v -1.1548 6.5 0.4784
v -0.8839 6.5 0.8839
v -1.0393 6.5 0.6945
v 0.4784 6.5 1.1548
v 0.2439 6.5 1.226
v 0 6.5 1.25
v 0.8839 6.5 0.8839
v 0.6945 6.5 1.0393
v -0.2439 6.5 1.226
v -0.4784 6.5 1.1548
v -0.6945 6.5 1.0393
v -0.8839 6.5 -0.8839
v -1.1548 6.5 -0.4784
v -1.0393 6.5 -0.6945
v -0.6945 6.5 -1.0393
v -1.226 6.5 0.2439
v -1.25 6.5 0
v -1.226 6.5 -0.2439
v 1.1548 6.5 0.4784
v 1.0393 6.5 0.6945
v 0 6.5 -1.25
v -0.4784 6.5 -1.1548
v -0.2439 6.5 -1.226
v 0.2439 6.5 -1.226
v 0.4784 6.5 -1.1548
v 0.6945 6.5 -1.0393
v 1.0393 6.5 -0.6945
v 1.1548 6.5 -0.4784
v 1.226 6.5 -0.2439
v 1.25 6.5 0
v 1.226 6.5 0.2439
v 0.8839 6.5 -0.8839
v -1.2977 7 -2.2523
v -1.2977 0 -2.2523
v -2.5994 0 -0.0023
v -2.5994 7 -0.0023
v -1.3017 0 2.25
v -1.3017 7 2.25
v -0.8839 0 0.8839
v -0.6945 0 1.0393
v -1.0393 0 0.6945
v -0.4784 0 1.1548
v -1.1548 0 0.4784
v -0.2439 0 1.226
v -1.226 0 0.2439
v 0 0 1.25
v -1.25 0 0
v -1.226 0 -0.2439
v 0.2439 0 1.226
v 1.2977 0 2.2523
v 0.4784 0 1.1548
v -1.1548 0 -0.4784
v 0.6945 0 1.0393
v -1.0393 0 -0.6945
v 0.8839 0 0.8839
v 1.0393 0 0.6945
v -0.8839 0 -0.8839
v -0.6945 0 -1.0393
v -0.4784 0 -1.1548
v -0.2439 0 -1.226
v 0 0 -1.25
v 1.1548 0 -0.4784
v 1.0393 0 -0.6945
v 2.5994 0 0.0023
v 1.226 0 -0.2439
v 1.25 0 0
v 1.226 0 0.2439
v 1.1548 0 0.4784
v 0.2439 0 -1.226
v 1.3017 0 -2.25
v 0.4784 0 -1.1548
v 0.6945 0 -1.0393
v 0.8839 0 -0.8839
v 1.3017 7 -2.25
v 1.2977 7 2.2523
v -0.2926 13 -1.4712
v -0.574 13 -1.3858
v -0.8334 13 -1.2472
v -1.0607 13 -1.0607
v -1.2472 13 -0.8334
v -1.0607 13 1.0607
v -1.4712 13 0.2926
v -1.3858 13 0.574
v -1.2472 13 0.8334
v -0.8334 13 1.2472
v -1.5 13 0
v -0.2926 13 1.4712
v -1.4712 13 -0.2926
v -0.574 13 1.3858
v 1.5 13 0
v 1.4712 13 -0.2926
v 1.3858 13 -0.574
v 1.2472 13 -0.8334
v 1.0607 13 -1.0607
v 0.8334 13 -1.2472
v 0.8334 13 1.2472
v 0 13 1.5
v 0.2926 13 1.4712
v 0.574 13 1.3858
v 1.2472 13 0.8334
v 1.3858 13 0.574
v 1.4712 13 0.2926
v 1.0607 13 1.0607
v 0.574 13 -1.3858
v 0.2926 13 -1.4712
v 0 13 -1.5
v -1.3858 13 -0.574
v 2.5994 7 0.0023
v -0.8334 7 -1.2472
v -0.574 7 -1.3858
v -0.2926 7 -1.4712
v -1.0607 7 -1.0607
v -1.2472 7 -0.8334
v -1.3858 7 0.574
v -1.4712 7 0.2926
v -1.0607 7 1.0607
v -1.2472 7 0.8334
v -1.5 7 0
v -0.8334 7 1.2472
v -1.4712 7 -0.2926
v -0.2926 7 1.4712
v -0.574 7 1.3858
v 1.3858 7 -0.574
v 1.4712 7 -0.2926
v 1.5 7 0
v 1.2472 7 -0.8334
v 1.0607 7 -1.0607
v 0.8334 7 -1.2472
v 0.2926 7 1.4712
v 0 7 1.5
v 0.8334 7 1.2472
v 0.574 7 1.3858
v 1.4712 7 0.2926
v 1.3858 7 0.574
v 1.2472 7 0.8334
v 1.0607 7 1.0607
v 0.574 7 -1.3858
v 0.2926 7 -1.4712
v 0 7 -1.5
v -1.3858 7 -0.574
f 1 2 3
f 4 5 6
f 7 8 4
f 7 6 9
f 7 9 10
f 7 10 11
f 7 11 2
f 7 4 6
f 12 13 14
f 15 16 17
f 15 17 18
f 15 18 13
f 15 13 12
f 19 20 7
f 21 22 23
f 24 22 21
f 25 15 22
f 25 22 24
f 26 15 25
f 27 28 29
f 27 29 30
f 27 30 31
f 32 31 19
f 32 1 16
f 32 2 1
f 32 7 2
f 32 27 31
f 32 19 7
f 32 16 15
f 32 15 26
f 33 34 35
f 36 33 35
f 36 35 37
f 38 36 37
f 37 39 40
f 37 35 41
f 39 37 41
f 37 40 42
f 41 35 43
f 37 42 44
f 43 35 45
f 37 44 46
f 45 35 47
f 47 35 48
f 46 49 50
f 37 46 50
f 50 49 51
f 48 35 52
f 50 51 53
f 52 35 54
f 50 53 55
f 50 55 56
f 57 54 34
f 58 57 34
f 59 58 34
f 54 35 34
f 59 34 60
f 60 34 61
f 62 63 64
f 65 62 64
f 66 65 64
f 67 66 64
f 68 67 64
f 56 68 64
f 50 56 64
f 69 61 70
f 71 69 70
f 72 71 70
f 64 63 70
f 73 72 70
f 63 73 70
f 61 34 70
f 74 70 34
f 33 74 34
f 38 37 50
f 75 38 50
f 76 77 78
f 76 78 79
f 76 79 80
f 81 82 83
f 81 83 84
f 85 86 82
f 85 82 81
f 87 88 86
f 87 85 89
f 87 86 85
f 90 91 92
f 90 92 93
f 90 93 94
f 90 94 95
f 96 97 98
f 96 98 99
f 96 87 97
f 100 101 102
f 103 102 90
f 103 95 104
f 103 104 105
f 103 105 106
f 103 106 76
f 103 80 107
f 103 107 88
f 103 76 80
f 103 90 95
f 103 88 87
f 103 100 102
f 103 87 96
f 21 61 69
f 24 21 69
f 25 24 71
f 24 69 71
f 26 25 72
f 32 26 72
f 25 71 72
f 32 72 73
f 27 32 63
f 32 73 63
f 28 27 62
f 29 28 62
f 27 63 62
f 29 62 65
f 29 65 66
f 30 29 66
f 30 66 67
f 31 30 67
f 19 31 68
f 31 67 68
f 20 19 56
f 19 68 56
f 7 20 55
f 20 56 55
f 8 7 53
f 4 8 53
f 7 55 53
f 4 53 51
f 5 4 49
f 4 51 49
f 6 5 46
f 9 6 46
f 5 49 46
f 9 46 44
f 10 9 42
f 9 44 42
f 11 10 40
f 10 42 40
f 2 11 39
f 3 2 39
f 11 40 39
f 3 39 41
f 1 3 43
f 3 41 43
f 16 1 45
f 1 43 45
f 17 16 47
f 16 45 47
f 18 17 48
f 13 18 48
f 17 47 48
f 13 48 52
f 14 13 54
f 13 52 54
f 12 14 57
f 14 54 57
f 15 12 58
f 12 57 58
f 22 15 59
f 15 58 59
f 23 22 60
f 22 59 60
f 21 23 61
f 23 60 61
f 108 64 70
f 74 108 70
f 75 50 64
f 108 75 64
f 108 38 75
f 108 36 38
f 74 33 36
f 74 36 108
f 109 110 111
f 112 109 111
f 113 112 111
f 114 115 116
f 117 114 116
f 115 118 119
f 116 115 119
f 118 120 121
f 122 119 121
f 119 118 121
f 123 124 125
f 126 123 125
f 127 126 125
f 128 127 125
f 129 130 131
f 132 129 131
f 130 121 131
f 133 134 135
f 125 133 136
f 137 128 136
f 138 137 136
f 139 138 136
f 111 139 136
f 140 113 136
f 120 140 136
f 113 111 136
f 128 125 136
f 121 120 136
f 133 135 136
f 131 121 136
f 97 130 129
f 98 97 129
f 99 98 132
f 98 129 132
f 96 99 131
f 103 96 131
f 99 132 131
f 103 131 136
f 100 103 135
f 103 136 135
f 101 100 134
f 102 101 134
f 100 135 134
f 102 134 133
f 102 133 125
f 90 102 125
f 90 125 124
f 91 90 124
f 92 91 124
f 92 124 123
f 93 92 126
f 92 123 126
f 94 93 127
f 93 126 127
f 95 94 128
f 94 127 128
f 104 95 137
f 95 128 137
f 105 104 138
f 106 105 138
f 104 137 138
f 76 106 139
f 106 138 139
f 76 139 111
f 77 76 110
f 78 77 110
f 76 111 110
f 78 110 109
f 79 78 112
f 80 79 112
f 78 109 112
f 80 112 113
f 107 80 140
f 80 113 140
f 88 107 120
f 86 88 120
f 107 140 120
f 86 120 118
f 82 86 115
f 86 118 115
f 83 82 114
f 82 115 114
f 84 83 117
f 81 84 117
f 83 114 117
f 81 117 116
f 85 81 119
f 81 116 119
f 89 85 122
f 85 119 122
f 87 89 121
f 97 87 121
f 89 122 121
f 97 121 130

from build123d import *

# Parameters (mm, degrees)
EXTRUDE_1_DEPTH     = 7
SKETCH_2_R          = 1.25
CUT_EXTRUDE_1_DEPTH = 6.5
SKETCH_3_R          = 1.5
EXTRUDE_2_DEPTH     = 6


with BuildPart() as part:
    # Эскиз1 → Бобышка-Вытянуть1 (new body)
    with BuildSketch(Plane(origin=(0, 0, 0), x_dir=(1, 0, 0), z_dir=(0, 1, 0))):
        Polygon((-1.301734413, -2.25), (1.297689952, -2.252335071), (2.599424365, -0.002335071), (1.301734413, 2.25), (-1.297689952, 2.252335071), (-2.599424365, 0.002335071), align=None)
    extrude(amount=EXTRUDE_1_DEPTH)

    # Эскиз2 → Вырез-Вытянуть1 (cut)
    with BuildSketch(Plane.XZ):
        with Locations(Location((0, 0, 0), (0, 0, 270))):
            Circle(SKETCH_2_R)
    extrude(amount=-CUT_EXTRUDE_1_DEPTH, mode=Mode.SUBTRACT)


with BuildPart() as body_2:
    # Эскиз3 → Бобышка-Вытянуть2 (new body)
    with BuildSketch(Plane(origin=(0, 7, 0), x_dir=(1, 0, 0), z_dir=(0, 1, 0))):
        with Locations(Location((0, 0, 0), (0, 0, 270))):
            Circle(SKETCH_3_R)
    extrude(amount=EXTRUDE_2_DEPTH)


solid = Compound([part.part, body_2.part])
